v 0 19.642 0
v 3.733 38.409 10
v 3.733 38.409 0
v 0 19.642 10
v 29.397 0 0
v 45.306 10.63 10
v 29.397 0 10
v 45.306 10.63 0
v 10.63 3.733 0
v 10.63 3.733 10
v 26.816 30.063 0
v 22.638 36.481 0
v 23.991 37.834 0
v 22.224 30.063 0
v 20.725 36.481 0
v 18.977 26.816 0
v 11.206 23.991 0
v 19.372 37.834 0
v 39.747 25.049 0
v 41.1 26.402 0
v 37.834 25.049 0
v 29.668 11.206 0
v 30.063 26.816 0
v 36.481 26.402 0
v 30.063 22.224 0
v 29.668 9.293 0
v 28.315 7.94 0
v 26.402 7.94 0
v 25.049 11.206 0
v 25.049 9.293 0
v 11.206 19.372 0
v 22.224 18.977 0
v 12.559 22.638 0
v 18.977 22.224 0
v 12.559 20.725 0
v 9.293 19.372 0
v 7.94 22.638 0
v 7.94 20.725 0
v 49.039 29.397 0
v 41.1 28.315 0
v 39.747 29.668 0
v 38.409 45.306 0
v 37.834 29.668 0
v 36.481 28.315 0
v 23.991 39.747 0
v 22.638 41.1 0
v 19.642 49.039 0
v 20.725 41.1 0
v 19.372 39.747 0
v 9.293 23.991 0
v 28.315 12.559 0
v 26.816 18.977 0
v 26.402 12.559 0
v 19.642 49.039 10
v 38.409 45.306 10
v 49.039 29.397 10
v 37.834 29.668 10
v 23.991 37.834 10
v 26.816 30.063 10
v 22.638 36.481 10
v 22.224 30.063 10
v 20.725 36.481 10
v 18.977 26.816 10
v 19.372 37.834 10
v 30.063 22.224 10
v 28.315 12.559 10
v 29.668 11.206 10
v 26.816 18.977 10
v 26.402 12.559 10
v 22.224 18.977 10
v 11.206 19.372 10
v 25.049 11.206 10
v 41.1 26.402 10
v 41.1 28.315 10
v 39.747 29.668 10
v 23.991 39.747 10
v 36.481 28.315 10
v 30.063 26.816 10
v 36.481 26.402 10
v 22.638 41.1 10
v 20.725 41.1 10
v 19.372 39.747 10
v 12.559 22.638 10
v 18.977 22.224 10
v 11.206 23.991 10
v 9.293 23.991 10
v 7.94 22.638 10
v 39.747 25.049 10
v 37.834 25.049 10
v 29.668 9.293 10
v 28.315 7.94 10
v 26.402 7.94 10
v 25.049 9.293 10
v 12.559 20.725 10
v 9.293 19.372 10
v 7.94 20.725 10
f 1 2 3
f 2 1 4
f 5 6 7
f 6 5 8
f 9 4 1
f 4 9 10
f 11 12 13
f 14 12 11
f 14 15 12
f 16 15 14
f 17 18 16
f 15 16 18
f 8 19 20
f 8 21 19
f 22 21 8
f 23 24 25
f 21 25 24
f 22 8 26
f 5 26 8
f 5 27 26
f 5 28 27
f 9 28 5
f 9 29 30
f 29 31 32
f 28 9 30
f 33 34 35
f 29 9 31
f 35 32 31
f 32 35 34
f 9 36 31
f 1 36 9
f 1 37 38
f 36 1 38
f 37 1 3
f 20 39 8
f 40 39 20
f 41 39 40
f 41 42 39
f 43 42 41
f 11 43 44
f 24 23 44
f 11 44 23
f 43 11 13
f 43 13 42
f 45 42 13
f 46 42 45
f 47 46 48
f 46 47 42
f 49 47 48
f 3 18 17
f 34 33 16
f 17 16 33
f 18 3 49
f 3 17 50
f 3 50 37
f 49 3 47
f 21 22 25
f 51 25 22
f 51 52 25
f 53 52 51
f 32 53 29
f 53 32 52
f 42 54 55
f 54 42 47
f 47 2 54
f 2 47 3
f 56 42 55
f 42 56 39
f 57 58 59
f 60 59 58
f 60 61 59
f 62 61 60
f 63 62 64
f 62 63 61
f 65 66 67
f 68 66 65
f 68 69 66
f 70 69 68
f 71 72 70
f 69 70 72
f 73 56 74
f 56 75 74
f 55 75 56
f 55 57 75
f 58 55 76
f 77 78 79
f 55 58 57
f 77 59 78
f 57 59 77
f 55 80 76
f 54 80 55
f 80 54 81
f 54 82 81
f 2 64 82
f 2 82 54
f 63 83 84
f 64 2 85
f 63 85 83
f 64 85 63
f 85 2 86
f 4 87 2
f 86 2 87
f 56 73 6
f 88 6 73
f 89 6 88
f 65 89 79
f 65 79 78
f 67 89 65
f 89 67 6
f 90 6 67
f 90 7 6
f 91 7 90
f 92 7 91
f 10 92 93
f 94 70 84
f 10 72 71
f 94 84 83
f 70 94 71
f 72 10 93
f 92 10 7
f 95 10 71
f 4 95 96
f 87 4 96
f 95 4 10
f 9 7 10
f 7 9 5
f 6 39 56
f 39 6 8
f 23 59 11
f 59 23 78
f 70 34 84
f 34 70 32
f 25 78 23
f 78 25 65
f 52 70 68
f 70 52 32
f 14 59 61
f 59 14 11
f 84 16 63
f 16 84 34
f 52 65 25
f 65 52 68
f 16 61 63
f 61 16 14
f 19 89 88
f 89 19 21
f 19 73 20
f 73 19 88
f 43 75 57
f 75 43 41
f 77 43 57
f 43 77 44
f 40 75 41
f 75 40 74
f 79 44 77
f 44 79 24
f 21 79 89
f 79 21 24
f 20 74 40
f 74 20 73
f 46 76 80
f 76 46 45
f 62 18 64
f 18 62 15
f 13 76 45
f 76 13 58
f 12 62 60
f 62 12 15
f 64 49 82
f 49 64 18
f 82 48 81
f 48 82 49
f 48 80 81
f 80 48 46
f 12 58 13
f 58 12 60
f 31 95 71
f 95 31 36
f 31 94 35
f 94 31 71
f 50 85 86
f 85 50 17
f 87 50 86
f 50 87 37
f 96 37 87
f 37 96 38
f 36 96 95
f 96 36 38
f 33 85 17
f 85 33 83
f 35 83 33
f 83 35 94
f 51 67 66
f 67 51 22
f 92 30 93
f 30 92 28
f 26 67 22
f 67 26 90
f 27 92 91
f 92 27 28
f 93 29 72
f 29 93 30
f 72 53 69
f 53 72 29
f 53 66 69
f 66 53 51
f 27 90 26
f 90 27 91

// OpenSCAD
$fn = 32;

// ----------------------------------------------------------------------
// Polygon plate: 8-gon R25, 4 bolt windows
// ----------------------------------------------------------------------

// --- parameters (mm) ---
sides = 8;                // number of polygon sides
plate_r = 25;             // circumscribed radius of the polygon
bore_r = 6;               // centre bore radius
bolts = 4;                // number of bolt windows
ring_r = 14.55;           // bolt-circle radius
bolt_r = 2.5;             // bolt window radius
plate_t = 10;             // plate thickness, Z (extrusion height)
fit_tol = 0.05;           // declared fit tolerance (prompt contract)
free_tol = 0.2;           // declared free tolerance (prompt contract)

plate_d = 2 * plate_r;  // circumscribed diameter
bore_d = 2 * bore_r;  // centre bore diameter
bolt_d = 2 * bolt_r;  // bolt window diameter
ring_d = 2 * ring_r;  // bolt-circle diameter

profile = [[49.039, 29.397], [38.409, 45.306], [19.642, 49.039], [3.733, 38.409], [0, 19.642], [10.63, 3.733], [29.397, 0], [45.306, 10.63]];  // primary outline, 8 points, counter clockwise
void_1 = [[30.063, 26.816], [26.816, 30.063], [22.224, 30.063], [18.977, 26.816], [18.977, 22.224], [22.224, 18.977], [26.816, 18.977], [30.063, 22.224]];  // centre bore, 8 points
void_2 = [[41.1, 28.315], [39.747, 29.668], [37.834, 29.668], [36.481, 28.315], [36.481, 26.402], [37.834, 25.049], [39.747, 25.049], [41.1, 26.402]];  // bolt window 1, 8 points
void_3 = [[23.991, 39.747], [22.638, 41.1], [20.725, 41.1], [19.372, 39.747], [19.372, 37.834], [20.725, 36.481], [22.638, 36.481], [23.991, 37.834]];  // bolt window 2, 8 points
void_4 = [[12.559, 22.638], [11.206, 23.991], [9.293, 23.991], [7.94, 22.638], [7.94, 20.725], [9.293, 19.372], [11.206, 19.372], [12.559, 20.725]];  // bolt window 3, 8 points
void_5 = [[29.668, 11.206], [28.315, 12.559], [26.402, 12.559], [25.049, 11.206], [25.049, 9.293], [26.402, 7.94], [28.315, 7.94], [29.668, 9.293]];  // bolt window 4, 8 points

// --- the one profile operation ---
difference() {
  linear_extrude(height = plate_t) polygon(points = profile);
  translate([0, 0, -1])
    linear_extrude(height = plate_t + 2) polygon(points = void_1);
  translate([0, 0, -1])
    linear_extrude(height = plate_t + 2) polygon(points = void_2);
  translate([0, 0, -1])
    linear_extrude(height = plate_t + 2) polygon(points = void_3);
  translate([0, 0, -1])
    linear_extrude(height = plate_t + 2) polygon(points = void_4);
  translate([0, 0, -1])
    linear_extrude(height = plate_t + 2) polygon(points = void_5);
}
